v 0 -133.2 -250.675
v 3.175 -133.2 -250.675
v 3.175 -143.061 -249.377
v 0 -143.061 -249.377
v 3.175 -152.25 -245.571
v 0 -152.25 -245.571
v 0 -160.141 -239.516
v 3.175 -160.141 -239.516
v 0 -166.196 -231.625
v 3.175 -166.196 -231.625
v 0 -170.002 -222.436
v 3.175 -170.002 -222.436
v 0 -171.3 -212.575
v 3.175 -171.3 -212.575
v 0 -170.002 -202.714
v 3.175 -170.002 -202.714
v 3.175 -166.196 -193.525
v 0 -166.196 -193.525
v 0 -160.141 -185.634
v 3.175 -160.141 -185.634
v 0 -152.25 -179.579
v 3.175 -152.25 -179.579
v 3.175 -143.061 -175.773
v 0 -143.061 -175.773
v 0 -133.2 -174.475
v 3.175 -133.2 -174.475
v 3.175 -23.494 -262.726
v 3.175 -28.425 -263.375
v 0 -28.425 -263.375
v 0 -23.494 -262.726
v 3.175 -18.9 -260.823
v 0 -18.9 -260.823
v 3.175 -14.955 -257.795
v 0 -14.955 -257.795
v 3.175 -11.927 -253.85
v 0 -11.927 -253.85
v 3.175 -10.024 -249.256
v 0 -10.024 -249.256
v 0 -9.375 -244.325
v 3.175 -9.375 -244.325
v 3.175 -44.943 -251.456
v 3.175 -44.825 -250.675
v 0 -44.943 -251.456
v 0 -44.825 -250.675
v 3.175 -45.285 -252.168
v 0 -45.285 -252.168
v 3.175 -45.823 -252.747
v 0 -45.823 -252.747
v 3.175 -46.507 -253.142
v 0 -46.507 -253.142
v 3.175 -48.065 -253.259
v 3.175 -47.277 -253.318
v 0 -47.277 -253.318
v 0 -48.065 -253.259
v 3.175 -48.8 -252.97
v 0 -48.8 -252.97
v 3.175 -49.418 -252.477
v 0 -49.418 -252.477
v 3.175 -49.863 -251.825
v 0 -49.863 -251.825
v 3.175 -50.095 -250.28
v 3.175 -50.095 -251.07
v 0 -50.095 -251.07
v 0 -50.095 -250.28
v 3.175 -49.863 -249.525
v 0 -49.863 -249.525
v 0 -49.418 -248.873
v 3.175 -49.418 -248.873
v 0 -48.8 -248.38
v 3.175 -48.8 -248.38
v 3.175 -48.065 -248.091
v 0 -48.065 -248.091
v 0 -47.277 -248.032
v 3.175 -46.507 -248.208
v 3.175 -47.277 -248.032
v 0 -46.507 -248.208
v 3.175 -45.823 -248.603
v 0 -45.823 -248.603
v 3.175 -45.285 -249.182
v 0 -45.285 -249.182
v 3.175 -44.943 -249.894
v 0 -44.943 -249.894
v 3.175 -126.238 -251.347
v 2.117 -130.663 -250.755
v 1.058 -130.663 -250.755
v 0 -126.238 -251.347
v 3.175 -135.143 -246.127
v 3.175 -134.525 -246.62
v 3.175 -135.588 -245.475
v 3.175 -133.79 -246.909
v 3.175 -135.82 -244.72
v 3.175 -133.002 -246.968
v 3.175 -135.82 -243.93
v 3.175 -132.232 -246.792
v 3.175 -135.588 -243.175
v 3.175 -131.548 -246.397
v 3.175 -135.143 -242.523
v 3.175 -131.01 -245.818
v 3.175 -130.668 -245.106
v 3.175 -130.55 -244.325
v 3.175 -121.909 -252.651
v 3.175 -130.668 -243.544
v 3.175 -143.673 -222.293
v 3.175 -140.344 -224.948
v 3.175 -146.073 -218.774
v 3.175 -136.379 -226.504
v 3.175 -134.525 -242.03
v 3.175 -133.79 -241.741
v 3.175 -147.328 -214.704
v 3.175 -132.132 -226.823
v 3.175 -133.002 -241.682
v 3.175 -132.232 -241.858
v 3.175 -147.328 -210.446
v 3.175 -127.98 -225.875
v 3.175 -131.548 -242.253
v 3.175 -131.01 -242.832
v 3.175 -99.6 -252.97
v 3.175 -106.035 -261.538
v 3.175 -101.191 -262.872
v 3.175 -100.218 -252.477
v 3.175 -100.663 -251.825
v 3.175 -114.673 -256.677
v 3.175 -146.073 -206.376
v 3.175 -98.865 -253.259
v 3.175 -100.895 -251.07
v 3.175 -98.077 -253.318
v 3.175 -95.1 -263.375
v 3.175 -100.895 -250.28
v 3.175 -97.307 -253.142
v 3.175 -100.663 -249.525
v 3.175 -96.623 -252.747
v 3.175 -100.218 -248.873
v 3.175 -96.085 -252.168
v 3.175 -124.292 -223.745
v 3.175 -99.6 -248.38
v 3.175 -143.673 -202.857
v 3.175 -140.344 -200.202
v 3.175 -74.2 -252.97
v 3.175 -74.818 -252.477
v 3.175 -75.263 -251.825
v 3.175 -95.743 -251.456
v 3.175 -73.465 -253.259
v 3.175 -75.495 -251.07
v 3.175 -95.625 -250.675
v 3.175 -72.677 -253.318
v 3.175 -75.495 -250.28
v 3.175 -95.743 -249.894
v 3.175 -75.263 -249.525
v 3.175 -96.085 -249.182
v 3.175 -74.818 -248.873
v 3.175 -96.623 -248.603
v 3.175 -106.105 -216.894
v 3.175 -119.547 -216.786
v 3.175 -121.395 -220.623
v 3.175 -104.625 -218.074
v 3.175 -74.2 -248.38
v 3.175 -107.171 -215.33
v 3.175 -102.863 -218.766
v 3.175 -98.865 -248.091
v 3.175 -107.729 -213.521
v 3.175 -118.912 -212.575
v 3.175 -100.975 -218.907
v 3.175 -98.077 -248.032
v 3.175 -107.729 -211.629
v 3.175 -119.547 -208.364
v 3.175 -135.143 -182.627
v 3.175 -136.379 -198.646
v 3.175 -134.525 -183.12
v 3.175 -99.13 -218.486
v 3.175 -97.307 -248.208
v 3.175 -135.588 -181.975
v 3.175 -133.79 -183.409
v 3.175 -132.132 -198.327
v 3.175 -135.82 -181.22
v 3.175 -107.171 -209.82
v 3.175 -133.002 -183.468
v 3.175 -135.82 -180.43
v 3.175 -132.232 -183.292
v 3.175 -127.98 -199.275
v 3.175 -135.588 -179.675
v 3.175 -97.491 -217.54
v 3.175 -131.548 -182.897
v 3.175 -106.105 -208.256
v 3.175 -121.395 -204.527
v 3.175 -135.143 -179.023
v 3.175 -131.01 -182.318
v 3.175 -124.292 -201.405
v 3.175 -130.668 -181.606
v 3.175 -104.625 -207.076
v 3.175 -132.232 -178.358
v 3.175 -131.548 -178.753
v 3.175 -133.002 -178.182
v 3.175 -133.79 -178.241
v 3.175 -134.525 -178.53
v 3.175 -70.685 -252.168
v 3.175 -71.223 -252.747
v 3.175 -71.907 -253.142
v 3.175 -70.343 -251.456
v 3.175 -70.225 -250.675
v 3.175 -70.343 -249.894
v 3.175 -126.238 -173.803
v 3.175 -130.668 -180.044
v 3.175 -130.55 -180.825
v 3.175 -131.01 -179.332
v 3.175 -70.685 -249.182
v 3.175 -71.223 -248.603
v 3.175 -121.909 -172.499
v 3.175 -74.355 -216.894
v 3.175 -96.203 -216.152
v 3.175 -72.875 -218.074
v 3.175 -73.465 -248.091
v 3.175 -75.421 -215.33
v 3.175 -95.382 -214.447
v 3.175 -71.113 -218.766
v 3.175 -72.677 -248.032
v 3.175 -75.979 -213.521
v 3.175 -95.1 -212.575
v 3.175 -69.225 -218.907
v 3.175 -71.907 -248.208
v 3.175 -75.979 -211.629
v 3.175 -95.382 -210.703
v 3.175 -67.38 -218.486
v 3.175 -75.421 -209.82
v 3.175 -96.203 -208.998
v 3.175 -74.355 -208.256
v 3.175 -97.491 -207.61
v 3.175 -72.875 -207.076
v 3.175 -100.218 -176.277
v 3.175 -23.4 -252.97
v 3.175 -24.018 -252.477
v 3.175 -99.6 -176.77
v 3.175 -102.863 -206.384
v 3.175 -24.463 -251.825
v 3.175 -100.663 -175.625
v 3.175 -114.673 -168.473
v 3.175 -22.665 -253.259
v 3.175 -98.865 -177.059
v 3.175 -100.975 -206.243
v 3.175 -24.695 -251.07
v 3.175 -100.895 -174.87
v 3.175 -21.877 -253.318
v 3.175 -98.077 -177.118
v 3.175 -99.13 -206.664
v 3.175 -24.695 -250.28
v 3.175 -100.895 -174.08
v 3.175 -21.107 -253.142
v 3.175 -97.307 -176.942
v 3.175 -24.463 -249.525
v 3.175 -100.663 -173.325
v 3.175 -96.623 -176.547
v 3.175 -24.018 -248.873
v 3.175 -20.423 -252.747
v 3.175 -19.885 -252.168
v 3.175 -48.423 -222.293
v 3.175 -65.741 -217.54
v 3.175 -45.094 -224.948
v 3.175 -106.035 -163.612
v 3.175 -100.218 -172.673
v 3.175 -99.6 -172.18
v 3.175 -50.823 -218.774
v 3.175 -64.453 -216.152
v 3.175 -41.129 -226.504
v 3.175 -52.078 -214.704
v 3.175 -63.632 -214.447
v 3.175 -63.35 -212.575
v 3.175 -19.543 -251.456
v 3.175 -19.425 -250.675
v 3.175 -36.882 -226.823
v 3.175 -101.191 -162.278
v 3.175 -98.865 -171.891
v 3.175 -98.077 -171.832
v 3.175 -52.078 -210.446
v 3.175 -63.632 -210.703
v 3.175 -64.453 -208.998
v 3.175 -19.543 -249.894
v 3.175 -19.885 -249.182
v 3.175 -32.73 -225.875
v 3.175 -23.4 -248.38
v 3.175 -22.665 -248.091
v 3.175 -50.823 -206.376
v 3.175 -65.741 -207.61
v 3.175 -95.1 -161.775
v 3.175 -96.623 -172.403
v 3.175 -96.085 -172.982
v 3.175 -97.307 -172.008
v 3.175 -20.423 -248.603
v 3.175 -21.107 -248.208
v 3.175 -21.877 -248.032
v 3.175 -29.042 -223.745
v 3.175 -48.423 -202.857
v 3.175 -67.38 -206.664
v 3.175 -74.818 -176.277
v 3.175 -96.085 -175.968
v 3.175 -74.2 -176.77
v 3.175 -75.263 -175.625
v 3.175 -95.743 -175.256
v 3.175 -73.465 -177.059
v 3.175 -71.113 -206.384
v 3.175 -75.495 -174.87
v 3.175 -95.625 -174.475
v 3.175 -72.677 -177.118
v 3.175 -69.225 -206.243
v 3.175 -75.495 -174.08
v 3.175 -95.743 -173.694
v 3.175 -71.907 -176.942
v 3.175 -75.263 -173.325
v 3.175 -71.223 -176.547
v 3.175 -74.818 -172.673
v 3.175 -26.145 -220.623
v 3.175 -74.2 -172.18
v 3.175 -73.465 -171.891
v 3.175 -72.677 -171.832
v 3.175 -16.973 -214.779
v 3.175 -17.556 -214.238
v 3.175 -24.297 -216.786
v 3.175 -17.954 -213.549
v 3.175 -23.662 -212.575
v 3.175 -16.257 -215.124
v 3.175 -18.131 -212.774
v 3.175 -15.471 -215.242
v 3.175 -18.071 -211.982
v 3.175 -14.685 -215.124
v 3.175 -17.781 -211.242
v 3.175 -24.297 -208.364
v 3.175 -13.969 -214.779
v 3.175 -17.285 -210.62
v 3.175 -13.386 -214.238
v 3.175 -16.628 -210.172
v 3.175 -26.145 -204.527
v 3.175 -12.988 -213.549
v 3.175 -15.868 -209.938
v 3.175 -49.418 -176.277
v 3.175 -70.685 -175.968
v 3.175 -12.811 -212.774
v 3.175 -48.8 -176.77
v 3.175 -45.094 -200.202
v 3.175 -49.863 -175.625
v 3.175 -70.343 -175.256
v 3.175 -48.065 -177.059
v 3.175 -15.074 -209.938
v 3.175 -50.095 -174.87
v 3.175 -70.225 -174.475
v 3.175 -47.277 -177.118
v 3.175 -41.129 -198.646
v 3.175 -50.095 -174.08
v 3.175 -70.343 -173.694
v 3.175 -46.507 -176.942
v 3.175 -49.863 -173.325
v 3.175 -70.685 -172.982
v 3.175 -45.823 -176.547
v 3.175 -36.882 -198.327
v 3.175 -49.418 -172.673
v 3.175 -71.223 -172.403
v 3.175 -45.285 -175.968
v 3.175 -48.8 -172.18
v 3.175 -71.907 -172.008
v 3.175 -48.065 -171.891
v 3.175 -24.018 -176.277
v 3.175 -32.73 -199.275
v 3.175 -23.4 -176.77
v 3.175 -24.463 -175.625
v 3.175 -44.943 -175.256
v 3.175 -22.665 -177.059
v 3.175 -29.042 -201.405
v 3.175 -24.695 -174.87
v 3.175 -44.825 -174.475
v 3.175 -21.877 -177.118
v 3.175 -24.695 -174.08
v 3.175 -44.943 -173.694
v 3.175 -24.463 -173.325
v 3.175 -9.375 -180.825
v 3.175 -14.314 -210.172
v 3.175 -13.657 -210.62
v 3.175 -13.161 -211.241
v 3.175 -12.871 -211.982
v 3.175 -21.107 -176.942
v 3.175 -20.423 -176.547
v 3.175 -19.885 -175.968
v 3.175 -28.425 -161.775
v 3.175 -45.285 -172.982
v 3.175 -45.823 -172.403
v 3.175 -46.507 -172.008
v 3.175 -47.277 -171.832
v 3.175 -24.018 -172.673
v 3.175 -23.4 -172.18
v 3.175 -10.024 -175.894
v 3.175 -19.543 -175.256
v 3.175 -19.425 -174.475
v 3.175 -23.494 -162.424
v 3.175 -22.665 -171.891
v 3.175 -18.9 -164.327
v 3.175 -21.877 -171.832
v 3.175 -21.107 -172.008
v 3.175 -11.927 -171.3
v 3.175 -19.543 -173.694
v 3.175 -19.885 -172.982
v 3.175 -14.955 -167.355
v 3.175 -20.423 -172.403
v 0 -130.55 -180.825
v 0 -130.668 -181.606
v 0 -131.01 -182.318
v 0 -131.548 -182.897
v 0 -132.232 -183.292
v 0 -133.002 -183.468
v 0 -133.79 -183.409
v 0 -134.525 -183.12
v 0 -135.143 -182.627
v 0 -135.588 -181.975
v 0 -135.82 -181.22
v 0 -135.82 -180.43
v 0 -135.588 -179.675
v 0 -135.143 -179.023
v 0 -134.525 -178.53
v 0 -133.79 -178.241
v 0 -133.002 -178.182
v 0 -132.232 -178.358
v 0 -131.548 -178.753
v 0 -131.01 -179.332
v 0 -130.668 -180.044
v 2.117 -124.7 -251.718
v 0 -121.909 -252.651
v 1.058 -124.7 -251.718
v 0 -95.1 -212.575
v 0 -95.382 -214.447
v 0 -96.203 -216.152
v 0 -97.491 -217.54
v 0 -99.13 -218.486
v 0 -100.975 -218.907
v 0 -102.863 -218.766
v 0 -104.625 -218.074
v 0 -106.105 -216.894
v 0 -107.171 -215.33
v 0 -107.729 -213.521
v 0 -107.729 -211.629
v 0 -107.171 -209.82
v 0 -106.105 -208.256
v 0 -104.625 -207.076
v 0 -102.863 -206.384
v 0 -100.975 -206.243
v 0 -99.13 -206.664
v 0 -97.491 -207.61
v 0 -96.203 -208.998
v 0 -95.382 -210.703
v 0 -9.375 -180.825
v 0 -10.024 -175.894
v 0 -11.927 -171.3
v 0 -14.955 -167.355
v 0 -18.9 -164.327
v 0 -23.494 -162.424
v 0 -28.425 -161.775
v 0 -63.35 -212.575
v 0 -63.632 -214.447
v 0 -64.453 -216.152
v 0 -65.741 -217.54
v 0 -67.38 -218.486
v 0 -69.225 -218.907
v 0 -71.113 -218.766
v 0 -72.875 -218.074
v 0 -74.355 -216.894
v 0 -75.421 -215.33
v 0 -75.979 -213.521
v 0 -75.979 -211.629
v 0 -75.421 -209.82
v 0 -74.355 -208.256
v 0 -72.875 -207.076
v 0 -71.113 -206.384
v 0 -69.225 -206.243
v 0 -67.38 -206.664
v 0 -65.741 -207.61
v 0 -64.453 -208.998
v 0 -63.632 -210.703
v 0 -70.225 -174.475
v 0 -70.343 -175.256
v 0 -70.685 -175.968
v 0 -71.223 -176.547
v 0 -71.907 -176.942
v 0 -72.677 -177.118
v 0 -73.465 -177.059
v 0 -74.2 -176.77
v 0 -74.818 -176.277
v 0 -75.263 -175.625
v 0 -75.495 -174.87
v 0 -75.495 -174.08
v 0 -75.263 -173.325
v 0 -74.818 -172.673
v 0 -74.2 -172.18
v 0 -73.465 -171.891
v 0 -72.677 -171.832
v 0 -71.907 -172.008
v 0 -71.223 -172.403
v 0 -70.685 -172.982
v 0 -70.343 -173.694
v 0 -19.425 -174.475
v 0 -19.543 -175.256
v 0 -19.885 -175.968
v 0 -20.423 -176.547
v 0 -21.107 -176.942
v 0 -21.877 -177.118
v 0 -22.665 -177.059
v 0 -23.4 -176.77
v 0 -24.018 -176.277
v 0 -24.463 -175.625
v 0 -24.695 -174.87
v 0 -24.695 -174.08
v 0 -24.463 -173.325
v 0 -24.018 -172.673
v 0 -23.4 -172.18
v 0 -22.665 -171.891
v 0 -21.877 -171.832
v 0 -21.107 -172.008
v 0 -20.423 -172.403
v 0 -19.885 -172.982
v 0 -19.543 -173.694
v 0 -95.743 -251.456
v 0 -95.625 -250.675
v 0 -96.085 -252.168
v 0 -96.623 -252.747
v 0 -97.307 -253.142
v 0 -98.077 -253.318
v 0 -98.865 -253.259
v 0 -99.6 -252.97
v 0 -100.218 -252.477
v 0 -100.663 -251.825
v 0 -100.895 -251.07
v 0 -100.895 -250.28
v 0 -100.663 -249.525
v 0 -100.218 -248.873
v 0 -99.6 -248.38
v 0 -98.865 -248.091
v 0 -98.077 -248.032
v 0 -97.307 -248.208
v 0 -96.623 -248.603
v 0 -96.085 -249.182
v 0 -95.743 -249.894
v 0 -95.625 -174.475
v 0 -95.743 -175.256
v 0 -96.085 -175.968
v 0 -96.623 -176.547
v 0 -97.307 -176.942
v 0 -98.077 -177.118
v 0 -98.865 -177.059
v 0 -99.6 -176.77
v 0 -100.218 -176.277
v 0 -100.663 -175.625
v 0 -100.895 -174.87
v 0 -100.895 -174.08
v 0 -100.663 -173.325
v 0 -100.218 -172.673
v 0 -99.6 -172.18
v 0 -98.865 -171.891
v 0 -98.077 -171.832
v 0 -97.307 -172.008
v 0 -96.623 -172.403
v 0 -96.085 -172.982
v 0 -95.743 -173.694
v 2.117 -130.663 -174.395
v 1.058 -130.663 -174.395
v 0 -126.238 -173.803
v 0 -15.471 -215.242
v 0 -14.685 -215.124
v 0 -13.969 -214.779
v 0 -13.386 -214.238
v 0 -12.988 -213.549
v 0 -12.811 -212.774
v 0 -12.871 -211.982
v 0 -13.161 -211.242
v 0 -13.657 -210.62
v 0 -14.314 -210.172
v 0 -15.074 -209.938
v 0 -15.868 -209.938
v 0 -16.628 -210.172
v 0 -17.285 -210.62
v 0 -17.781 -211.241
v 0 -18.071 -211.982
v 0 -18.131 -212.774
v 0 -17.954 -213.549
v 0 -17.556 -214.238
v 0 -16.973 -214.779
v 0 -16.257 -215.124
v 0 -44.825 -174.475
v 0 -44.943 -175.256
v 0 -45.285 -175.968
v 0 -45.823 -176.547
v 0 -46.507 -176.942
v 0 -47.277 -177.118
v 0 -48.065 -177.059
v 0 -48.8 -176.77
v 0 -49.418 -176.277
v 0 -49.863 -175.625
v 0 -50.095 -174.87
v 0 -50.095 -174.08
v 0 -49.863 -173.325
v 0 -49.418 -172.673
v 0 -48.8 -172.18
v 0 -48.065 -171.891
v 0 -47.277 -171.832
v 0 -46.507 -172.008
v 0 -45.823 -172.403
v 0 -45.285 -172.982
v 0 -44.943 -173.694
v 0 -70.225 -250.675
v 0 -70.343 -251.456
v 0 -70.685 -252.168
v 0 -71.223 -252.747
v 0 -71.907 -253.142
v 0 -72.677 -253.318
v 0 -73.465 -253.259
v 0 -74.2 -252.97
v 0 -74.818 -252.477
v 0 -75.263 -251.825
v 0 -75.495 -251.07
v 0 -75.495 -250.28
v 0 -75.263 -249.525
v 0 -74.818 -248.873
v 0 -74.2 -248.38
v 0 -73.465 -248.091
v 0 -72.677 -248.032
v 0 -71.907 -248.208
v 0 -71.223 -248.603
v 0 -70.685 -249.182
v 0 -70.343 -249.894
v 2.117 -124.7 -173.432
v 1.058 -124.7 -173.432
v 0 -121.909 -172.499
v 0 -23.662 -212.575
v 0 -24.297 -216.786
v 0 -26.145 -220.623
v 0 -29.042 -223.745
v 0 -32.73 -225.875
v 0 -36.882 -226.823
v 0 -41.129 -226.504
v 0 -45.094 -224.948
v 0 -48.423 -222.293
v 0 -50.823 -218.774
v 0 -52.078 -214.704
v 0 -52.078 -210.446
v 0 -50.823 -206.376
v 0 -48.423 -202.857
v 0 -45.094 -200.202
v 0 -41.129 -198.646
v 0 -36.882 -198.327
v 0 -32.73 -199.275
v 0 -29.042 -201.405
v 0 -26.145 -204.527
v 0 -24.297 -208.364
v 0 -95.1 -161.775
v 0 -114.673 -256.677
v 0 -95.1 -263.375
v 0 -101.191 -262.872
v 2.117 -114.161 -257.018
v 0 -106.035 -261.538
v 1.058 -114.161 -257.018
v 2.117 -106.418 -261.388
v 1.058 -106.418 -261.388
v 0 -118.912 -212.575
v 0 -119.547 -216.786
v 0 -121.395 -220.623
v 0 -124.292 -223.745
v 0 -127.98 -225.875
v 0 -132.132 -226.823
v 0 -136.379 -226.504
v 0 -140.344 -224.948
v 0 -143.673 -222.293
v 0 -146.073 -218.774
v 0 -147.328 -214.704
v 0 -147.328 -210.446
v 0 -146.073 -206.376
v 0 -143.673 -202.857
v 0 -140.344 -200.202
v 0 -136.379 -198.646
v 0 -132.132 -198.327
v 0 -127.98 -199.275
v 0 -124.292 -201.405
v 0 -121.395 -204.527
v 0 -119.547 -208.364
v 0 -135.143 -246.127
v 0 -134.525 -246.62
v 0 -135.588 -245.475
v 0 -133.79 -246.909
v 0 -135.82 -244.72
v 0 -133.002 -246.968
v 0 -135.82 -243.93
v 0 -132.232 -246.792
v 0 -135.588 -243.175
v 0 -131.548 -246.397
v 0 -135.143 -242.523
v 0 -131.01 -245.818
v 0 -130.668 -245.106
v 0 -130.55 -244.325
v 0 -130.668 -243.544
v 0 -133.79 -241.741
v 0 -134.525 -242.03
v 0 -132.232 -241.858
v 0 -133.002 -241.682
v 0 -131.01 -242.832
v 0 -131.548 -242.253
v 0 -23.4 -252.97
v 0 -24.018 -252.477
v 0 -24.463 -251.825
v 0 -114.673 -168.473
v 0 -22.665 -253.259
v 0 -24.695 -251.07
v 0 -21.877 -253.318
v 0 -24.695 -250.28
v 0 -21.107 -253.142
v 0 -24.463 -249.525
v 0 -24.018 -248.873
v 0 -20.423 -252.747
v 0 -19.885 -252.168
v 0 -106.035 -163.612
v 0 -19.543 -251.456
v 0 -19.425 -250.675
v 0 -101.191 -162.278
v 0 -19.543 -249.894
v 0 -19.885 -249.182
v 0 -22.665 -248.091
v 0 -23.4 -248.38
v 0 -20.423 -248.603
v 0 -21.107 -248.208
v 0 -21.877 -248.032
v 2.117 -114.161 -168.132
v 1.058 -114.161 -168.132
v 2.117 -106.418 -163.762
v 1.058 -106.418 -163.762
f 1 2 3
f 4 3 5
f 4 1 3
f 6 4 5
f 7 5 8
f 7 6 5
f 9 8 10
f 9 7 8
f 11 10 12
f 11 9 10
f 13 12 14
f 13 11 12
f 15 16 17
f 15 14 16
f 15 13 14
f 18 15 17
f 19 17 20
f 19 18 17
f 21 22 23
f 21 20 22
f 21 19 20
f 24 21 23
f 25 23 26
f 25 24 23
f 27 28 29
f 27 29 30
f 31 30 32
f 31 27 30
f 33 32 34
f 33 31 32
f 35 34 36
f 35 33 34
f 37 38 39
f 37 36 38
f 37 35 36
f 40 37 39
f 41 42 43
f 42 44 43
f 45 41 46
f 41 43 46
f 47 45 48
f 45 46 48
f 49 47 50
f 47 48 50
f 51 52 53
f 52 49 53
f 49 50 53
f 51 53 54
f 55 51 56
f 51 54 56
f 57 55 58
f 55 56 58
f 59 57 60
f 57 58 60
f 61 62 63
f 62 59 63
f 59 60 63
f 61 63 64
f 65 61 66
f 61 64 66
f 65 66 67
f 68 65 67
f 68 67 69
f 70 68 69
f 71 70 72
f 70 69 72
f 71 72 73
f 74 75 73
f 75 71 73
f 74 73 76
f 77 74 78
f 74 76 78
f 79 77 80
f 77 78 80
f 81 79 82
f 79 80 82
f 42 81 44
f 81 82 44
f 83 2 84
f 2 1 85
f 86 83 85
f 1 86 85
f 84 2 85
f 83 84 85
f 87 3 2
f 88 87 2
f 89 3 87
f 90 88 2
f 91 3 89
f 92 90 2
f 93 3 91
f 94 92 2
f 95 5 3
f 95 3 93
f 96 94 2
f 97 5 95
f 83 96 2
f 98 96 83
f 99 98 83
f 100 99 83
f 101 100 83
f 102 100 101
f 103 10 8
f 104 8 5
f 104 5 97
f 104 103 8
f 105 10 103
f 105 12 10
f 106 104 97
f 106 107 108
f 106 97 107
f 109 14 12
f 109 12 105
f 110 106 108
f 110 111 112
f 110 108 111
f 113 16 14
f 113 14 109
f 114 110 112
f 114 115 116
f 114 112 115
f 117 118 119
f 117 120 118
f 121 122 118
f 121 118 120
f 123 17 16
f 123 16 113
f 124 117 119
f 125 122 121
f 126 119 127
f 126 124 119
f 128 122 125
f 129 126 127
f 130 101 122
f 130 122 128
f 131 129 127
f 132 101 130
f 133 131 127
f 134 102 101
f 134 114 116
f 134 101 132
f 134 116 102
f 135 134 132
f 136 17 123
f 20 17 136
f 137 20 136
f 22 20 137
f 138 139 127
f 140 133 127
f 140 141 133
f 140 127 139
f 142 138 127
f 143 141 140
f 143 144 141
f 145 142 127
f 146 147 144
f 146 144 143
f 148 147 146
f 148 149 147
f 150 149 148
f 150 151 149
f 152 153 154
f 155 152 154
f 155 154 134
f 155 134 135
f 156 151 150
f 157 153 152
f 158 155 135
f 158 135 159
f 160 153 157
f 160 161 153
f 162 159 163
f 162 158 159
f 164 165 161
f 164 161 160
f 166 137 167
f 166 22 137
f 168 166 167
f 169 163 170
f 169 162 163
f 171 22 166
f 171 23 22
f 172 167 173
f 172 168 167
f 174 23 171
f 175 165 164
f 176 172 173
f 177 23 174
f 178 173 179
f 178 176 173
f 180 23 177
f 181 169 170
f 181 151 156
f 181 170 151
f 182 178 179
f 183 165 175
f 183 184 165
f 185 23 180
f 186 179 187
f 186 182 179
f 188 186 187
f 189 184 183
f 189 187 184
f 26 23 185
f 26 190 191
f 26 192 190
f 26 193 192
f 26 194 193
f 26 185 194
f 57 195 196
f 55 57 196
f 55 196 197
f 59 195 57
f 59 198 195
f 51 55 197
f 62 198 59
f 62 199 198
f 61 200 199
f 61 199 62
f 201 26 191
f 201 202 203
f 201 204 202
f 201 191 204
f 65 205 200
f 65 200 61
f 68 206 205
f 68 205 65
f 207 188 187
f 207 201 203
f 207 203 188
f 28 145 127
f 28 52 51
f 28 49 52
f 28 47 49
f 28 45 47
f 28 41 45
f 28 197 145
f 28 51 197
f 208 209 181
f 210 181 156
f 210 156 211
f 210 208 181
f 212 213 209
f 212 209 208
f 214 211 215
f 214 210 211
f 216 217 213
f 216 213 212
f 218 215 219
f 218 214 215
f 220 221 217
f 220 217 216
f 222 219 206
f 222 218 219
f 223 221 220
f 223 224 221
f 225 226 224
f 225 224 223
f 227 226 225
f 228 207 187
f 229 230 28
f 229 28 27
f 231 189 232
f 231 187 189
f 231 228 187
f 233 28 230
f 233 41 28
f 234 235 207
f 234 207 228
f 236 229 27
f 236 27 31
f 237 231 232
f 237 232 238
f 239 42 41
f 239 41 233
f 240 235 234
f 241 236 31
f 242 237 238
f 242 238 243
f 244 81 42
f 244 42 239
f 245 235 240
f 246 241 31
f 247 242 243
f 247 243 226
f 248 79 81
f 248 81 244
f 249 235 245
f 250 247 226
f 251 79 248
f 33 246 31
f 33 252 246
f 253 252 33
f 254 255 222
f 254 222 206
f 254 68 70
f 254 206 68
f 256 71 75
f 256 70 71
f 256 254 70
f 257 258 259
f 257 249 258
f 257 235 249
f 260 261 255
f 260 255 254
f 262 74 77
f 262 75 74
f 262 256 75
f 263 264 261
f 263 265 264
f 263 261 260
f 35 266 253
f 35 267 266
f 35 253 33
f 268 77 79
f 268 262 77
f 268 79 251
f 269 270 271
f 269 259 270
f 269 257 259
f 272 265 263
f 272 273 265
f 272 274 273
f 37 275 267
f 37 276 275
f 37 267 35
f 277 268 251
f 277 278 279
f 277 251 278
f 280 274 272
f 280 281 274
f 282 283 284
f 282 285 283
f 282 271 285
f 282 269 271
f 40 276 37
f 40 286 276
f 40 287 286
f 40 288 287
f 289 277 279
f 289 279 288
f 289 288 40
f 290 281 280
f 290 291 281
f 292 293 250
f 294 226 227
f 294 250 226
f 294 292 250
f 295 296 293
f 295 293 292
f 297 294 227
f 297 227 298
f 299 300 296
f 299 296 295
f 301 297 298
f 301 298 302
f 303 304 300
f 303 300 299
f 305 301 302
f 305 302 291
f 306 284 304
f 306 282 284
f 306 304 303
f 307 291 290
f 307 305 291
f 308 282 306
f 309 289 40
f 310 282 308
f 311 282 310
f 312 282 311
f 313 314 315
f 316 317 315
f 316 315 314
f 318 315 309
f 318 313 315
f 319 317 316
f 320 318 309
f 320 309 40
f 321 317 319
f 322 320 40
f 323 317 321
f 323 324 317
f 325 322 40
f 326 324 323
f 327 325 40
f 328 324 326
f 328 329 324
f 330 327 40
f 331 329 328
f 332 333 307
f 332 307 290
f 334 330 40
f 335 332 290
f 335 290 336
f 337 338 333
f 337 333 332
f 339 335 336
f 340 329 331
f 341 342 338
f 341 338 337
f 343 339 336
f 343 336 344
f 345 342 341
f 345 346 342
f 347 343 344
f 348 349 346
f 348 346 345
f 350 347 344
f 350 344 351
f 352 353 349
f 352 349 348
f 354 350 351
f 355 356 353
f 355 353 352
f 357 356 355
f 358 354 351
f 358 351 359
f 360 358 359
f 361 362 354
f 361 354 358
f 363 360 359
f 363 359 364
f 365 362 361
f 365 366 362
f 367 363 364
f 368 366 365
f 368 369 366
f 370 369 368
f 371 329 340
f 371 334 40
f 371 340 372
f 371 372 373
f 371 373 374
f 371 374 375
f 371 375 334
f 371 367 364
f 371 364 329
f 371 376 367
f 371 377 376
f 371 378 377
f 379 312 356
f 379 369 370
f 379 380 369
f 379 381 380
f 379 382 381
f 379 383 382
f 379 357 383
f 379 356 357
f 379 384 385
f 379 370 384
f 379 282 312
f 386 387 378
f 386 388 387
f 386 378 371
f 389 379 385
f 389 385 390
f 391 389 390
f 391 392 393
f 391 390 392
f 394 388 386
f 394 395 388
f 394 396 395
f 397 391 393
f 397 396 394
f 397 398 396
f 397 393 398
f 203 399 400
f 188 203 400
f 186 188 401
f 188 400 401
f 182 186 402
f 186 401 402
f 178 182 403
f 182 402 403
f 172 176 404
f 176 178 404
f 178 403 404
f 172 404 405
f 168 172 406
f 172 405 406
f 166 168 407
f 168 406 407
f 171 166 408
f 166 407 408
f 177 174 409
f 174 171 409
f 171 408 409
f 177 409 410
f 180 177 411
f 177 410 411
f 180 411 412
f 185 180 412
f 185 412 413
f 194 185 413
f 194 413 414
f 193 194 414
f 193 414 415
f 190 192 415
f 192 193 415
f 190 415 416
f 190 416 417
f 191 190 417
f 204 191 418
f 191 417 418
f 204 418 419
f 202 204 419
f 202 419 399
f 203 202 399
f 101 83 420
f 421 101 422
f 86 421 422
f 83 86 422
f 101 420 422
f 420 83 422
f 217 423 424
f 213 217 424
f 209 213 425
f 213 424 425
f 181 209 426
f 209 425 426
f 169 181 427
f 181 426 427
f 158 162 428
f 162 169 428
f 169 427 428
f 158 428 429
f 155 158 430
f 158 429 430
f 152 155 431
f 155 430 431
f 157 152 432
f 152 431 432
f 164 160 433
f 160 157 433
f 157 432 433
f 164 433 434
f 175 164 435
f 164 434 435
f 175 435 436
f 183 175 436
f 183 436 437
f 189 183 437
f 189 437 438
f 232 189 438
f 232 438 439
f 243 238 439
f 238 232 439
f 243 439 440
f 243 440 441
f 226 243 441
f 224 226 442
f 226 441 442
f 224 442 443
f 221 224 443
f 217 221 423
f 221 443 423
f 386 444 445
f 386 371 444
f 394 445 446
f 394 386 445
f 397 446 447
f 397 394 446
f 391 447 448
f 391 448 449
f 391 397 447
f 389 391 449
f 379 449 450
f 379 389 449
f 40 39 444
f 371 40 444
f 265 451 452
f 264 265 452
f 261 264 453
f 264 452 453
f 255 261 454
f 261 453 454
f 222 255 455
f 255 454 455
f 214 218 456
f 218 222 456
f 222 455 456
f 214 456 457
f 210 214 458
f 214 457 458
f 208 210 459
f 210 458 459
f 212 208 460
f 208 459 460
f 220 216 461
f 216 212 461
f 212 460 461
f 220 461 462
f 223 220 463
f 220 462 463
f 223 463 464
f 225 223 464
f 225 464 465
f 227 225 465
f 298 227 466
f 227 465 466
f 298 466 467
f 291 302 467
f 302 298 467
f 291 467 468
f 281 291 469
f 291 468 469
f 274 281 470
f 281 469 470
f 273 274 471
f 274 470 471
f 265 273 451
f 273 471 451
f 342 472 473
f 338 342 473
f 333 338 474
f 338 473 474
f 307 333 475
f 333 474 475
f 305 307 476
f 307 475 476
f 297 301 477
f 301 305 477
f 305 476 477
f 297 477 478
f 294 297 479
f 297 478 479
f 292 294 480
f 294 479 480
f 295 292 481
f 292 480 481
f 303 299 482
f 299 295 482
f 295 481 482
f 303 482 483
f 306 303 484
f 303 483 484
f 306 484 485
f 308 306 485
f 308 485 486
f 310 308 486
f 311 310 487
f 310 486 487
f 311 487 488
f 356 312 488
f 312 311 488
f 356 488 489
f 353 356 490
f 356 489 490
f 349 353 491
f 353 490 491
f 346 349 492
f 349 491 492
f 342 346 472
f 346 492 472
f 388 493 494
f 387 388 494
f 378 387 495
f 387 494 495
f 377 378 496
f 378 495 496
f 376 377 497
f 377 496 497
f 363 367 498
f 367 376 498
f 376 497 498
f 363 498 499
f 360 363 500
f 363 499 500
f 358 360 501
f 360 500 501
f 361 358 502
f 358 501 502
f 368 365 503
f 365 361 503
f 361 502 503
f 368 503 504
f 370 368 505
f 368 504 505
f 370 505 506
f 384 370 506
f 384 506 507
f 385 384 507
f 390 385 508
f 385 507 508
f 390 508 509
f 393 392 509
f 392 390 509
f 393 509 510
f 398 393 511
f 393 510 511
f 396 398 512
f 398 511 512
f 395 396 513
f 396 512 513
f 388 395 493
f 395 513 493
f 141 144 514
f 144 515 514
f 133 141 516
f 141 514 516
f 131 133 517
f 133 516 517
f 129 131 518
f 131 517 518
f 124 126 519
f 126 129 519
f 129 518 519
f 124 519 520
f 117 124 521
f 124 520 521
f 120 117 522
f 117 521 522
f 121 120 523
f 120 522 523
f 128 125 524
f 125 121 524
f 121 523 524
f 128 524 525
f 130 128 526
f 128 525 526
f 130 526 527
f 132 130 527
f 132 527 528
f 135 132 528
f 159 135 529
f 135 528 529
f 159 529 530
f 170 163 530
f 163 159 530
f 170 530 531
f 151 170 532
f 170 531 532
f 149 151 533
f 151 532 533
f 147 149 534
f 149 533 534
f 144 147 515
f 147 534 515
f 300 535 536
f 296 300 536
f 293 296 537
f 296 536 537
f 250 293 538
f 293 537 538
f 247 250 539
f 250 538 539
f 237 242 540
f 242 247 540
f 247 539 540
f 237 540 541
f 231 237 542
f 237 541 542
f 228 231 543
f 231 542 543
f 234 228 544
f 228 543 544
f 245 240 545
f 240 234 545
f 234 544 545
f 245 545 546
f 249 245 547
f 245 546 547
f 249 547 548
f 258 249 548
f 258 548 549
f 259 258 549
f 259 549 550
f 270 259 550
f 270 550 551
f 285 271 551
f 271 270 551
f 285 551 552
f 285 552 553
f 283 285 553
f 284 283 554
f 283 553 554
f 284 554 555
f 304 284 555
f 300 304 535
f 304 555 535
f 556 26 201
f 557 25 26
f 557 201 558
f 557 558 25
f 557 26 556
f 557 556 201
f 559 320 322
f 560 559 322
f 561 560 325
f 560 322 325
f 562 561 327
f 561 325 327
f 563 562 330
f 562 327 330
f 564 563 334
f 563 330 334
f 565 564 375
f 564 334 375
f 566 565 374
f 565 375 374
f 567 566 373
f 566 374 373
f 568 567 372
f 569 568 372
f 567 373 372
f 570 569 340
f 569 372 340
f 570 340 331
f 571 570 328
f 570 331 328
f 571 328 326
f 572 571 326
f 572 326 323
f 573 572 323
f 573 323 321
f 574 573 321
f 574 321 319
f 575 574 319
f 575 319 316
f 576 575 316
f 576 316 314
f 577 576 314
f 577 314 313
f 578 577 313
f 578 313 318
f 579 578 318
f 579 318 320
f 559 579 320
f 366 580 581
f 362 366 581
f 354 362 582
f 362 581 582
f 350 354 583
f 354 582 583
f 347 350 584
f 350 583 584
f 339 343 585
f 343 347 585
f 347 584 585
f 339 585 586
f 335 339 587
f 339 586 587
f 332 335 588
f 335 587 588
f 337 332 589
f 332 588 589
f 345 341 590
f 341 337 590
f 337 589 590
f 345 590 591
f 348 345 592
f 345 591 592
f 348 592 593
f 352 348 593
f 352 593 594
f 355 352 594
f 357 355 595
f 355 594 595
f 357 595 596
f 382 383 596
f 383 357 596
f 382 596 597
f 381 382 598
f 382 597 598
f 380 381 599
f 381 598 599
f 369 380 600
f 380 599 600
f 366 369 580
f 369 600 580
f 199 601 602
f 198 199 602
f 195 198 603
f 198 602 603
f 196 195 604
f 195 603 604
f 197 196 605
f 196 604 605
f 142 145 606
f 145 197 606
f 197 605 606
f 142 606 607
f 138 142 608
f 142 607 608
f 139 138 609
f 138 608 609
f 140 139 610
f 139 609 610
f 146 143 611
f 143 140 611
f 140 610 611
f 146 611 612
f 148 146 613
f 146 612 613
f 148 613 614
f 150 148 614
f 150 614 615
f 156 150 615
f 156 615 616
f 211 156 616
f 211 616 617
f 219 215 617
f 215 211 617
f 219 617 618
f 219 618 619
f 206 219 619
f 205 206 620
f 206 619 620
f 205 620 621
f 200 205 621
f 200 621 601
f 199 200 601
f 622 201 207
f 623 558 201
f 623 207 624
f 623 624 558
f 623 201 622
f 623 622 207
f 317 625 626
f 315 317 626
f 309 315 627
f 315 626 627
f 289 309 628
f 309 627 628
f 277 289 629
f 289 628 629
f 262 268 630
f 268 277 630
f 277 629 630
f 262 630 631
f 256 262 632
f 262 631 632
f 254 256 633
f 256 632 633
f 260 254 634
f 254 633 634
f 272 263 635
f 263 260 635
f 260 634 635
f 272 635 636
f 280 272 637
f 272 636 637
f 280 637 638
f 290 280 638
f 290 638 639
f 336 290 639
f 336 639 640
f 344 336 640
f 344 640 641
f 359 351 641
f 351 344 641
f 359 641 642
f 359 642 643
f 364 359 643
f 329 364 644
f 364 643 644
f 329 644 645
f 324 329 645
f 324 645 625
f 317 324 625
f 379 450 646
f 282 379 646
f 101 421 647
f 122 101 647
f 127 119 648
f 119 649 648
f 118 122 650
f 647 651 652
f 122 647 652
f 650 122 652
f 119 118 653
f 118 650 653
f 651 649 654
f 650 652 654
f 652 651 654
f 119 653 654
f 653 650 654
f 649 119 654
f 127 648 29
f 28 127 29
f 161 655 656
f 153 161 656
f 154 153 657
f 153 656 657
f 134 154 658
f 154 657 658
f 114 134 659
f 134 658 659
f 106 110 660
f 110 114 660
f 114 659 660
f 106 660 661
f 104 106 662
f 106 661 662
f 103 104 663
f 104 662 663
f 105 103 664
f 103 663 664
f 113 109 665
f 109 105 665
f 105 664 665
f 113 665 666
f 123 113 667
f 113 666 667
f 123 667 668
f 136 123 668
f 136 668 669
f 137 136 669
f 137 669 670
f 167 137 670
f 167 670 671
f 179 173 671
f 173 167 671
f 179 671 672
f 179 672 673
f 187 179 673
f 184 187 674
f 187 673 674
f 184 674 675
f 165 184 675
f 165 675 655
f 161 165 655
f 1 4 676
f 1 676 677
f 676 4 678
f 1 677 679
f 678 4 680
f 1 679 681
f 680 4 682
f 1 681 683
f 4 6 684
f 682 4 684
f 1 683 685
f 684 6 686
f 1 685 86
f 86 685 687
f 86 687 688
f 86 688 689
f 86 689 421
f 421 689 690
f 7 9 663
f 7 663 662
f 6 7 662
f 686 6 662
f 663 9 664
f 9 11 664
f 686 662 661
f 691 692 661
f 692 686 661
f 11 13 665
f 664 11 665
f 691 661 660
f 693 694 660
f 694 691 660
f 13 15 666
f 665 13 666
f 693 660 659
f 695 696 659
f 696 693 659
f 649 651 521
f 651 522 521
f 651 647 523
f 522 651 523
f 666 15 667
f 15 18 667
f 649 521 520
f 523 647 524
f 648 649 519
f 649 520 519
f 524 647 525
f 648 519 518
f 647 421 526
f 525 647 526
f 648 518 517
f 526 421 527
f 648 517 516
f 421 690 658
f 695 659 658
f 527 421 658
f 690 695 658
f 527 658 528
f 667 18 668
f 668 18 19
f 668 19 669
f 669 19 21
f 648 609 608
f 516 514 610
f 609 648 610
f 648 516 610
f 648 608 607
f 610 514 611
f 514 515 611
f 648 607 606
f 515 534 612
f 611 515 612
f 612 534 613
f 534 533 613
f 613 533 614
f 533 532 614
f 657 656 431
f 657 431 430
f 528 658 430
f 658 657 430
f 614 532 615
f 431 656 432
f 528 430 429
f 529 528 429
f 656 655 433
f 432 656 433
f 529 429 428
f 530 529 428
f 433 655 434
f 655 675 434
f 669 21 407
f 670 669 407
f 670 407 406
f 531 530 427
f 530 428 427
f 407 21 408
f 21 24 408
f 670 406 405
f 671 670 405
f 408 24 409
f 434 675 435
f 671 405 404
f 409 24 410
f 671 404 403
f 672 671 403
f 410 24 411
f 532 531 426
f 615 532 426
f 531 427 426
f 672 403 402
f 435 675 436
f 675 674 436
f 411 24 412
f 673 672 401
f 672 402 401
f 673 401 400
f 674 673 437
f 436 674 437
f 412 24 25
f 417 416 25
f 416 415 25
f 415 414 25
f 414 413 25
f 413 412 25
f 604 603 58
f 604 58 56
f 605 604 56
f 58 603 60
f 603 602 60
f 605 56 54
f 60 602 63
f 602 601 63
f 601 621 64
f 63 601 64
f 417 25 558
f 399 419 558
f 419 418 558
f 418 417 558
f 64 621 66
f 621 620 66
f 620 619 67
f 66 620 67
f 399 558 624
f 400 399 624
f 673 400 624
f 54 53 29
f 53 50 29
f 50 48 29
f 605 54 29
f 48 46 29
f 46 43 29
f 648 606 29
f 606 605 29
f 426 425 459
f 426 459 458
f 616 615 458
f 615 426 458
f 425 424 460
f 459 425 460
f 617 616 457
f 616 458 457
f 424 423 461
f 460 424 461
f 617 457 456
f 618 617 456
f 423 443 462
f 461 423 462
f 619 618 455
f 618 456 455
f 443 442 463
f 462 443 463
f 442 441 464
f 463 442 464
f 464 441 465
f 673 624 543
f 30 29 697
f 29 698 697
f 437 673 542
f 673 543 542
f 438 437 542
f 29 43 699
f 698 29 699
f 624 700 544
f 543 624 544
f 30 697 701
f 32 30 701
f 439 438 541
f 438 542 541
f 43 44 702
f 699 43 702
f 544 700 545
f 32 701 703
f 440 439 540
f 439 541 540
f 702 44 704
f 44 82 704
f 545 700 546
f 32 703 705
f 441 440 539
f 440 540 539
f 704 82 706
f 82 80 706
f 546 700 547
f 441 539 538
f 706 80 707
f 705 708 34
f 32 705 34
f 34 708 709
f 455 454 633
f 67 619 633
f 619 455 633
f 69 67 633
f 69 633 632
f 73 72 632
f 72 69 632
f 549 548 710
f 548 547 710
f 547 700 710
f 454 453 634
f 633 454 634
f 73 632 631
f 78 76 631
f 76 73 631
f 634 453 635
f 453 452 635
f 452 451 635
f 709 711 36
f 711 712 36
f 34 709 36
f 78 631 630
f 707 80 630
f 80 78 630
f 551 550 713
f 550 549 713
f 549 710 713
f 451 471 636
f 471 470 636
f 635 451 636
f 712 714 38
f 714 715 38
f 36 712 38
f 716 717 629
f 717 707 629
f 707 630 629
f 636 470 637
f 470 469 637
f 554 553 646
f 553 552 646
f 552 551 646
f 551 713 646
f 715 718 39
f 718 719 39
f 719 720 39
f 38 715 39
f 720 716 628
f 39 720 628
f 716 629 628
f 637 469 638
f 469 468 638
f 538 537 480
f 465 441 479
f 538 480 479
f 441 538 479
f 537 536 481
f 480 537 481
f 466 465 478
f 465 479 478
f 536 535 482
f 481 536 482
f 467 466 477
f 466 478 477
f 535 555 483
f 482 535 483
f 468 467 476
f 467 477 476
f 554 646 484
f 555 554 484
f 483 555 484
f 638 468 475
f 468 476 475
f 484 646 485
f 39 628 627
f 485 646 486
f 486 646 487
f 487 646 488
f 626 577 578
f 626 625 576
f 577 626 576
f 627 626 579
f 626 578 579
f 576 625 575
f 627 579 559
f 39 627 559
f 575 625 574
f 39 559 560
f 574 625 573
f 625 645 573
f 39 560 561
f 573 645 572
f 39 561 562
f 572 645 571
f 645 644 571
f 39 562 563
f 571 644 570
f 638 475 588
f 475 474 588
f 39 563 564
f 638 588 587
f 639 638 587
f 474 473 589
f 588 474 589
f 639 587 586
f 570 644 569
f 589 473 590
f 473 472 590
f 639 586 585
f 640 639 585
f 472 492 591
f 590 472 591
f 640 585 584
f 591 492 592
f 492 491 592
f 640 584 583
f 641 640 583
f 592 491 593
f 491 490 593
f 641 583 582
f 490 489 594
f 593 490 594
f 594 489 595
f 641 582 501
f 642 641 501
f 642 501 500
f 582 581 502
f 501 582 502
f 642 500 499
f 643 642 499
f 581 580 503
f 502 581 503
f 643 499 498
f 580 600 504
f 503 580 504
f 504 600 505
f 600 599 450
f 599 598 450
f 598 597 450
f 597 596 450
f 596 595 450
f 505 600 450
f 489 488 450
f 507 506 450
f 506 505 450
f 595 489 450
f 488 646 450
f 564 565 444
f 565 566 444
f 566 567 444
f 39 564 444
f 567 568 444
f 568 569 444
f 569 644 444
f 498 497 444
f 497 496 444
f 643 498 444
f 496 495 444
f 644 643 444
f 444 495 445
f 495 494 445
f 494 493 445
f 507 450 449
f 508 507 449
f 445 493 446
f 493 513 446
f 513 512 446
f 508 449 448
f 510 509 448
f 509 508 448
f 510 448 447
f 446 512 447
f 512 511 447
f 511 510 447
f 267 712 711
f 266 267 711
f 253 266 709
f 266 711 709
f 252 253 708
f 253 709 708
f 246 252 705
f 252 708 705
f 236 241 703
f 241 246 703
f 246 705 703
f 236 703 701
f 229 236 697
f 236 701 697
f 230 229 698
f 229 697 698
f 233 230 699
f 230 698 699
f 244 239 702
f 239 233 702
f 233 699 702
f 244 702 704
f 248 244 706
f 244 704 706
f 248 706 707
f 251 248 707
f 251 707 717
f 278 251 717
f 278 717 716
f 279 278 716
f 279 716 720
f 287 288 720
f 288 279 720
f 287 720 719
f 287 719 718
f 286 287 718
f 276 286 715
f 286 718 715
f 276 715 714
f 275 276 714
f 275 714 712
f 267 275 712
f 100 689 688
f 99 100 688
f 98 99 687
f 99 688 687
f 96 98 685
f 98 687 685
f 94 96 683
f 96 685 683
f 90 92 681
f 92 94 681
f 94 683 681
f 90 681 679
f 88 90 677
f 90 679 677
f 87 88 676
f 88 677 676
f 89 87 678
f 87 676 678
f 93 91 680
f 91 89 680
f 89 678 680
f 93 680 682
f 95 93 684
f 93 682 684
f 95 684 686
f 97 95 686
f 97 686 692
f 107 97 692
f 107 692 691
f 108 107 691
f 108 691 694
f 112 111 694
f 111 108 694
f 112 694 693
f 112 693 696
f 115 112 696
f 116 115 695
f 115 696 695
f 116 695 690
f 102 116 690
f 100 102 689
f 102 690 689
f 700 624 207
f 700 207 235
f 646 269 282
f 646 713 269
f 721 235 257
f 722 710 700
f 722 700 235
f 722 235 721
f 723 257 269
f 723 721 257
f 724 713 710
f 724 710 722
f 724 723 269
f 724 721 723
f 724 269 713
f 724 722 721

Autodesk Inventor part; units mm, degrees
ref_plane "YZ Plane" through (0, 0, 0) normal (1, 0, 0) x (0, 1, 0)
ref_plane "XZ Plane" through (0, 0, 0) normal (0, 1, 0) x (-1, 0, 0)
ref_plane "XY Plane" through (0, 0, 0) normal (0, 0, 1) x (1, 0, 0)
sketch "Sketch1" plane through (0, 0, 0) normal (1, 0, 0) x (0, 1, 0)
  line L0 (0, 0) -> (101.6, 0)
  line L1 (101.6, 0) -> (101.6, -152.4)
  line L2 (101.6, -152.4) -> (0, -152.4)
  line L3 (0, -152.4) -> (0, 0)
  circle A0 centre (50.8, -28.575) radius 14.2875
  circle A1 centre (50.8, -60.325) radius 6.35
  circle A2 centre (50.8, -92.075) radius 6.35
  circle A3 centre (50.8, -123.825) radius 14.2875
  line L4 (50.8, -28.575) -> (50.8, -123.825) construction
  circle A4 centre (88.9, -12.7) radius 2.65
  circle A5 centre (88.9, -38.1) radius 2.65
  circle A6 centre (88.9, -63.5) radius 2.65
  circle A7 centre (88.9, -88.9) radius 2.65
  circle A8 centre (88.9, -114.3) radius 2.65
  circle A9 centre (88.9, -139.7) radius 2.65
  circle A10 centre (12.7, -12.7) radius 2.65
  circle A11 centre (12.7, -38.1) radius 2.65
  circle A12 centre (12.7, -63.5) radius 2.65
  circle A13 centre (12.7, -88.9) radius 2.65
  circle A14 centre (12.7, -114.3) radius 2.65
  circle A15 centre (12.7, -139.7) radius 2.65
  line L5 (76.2, -152.4) -> (76.2, -508.635)
  line L6 (25.4, -187.175) -> (25.4, -152.4)
  circle A16 centre (50.8, -212.575) radius 6.35
  line L7 (50.8, -212.575) -> (-444.4159, 282.6409) construction
  line L8 (50.8, -212.575) -> (751.141, -212.575) construction
  line L9 (-161.775, -263.375) -> (-9.375, -263.375)
  line L10 (-9.375, -263.375) -> (-9.375, -161.775)
  line L11 (-9.375, -161.775) -> (-161.775, -161.775)
  circle A17 centre (-133.2, -212.575) radius 14.2875
  circle A18 centre (-101.45, -212.575) radius 6.35
  circle A19 centre (-69.7, -212.575) radius 6.35
  circle A20 centre (-37.95, -212.575) radius 14.2875
  line L12 (-133.2, -212.575) -> (-37.95, -212.575) construction
  circle A21 centre (-149.075, -250.675) radius 2.65
  circle A22 centre (-123.675, -250.675) radius 2.65
  circle A23 centre (-98.275, -250.675) radius 2.65
  circle A24 centre (-72.875, -250.675) radius 2.65
  circle A25 centre (-47.475, -250.675) radius 2.65
  circle A26 centre (-22.075, -250.675) radius 2.65
  circle A27 centre (-149.075, -174.475) radius 2.65
  circle A28 centre (-123.675, -174.475) radius 2.65
  circle A29 centre (-98.275, -174.475) radius 2.65
  circle A30 centre (-72.875, -174.475) radius 2.65
  circle A31 centre (-47.475, -174.475) radius 2.65
  circle A32 centre (-22.075, -174.475) radius 2.65
  line L13 (-9.375, -237.975) -> (346.86, -237.975)
  line L14 (25.4, -187.175) -> (-9.375, -187.175)
  circle A33 centre (50.8, -212.575) radius 6.35
  line L15 (50.8, -212.575) -> (50.8, -912.916) construction
  line L16 (76.2, -237.975) -> (346.86, -237.975)
  line L17 (76.2, -508.635) -> (76.2, -237.975)
  line L18 (-161.775, -161.775) -> (-161.775, -263.375)
  circle A34 centre (50.8, -28.575) radius 25.4 construction
  circle A35 centre (50.8, -28.575) radius 38.1
  circle A36 centre (82.55, -28.575) radius 2.65
  circle A37 centre (19.05, -28.575) radius 2.65
  line L19 (88.9, -28.575) -> (88.9, -47.625) construction
  line L20 (88.9, -47.625) -> (101.6, -47.625) construction
  line L21 (101.6, -47.625) -> (101.6, -66.675) construction
  spline S0 degree 3 poles (88.9, -28.575) (88.9, -47.625) (101.6, -47.625) (101.6, -66.675) knots 1 1 1 1 2 2 2 2
  line L22 (12.7, -28.575) -> (12.7, -47.625) construction
  line L23 (12.7, -47.625) -> (0, -47.625) construction
  line L24 (0, -47.625) -> (0, -66.675) construction
  spline S1 degree 3 poles (12.7, -28.575) (12.7, -47.625) (0, -47.625) (0, -66.675) knots 1 1 1 1 2 2 2 2
  spline S2 degree 3 poles (-133.2, -174.475) (-114.15, -174.475) (-114.15, -161.775) (-95.1, -161.775) knots 1 1 1 1 2 2 2 2
  line L25 (-133.2, -174.475) -> (-114.15, -174.475) construction
  line L26 (-114.15, -174.475) -> (-114.15, -161.775) construction
  line L27 (-114.15, -161.775) -> (-95.1, -161.775) construction
  circle A38 centre (-133.2, -212.575) radius 38.1
  circle A39 centre (-133.2, -180.825) radius 2.65
  spline S3 degree 3 poles (-133.2, -250.675) (-114.15, -250.675) (-114.15, -263.375) (-95.1, -263.375) knots 1 1 1 1 2 2 2 2
  line L28 (-133.2, -250.675) -> (-114.15, -250.675) construction
  line L29 (-114.15, -250.675) -> (-114.15, -263.375) construction
  line L30 (-114.15, -263.375) -> (-95.1, -263.375) construction
  circle A40 centre (-133.2, -244.325) radius 2.65
  point P0 (101.6, -76.2)
  point P1 (50.8, -76.2)
  point P2 (50.8, -152.4)
  point P3 (-85.575, -263.375)
  point P4 (-85.575, -212.575)
  point P5 (-9.375, -212.575)
  point P6 (63.5, -470.535)
  point P7 (0, -66.675)
  point P8 (-126.2384, -251.347)
  point P9 (-121.9095, -252.6512)
  dimension "d32" = 76.2
  dimension "d0" = 101.6
  dimension "d1" = 152.4
  dimension "d2" = 28.575
  dimension "d3" = 12.7
  dimension "d4" = 12.7
  dimension "d5" = 28.575
  dimension "d6" = 31.75
  dimension "d7" = 31.75
  dimension "d8" = 31.75
  dimension "d9" = 5.3
  dimension "d10" = 12.7
  dimension "d11" = 12.7
  dimension "d14" = 25.4
  dimension "d17" = 76.2
  dimension "d22" = 12.7
  dimension "d24" = 184
  dimension "d25" = 25.4
  dimension "d26" = 50.8
  dimension "d27" = 135
  dimension "d31" = 50.8
  dimension "d33" = 31.75
  dimension "d34" = 31.75
  dimension "d35" = 19.05
  dimension "d36" = 19.05
  dimension "d39" = 90
  dimension "d41" = 31.75
extrude "Extrusion1" add sketch "Sketch1" along normal blind 3.175 contours L10 L9 S3 A22 A38 A28 S2 L11 | A28 A38 S2 | S3 A22 A38 | A38 A28 A22 L18 | L18 A38 | A28 A38 S2 | S3 A38 A22 | A28 A38 | A22 A38
fillet "Fillet3" radius 19.05 2 edges at (1.5875, -9.375, -161.775) (1.5875, -9.375, -263.375)
sketch "Sketch3" plane through (3.175, 0, 0) normal (1, 0, 0) x (0, 0, -1)
  line L0 (244.325, -9.375) -> (180.825, -9.375) projected
  line L1 (212.575, -9.375) -> (212.575, -15.471)
  circle A0 centre (212.575, -15.471) radius 2.667
  point P0 (0, 0)
  dimension "d43" = 6.096
  dimension "d44" = 5.334
extrude "Extrusion2" cut sketch "Sketch3" against normal blind 25.4
equation "\"d7\" = d6"
equation "\"d8\" = d7"
properties part number "L1Plate" material "Aluminum 6061"
